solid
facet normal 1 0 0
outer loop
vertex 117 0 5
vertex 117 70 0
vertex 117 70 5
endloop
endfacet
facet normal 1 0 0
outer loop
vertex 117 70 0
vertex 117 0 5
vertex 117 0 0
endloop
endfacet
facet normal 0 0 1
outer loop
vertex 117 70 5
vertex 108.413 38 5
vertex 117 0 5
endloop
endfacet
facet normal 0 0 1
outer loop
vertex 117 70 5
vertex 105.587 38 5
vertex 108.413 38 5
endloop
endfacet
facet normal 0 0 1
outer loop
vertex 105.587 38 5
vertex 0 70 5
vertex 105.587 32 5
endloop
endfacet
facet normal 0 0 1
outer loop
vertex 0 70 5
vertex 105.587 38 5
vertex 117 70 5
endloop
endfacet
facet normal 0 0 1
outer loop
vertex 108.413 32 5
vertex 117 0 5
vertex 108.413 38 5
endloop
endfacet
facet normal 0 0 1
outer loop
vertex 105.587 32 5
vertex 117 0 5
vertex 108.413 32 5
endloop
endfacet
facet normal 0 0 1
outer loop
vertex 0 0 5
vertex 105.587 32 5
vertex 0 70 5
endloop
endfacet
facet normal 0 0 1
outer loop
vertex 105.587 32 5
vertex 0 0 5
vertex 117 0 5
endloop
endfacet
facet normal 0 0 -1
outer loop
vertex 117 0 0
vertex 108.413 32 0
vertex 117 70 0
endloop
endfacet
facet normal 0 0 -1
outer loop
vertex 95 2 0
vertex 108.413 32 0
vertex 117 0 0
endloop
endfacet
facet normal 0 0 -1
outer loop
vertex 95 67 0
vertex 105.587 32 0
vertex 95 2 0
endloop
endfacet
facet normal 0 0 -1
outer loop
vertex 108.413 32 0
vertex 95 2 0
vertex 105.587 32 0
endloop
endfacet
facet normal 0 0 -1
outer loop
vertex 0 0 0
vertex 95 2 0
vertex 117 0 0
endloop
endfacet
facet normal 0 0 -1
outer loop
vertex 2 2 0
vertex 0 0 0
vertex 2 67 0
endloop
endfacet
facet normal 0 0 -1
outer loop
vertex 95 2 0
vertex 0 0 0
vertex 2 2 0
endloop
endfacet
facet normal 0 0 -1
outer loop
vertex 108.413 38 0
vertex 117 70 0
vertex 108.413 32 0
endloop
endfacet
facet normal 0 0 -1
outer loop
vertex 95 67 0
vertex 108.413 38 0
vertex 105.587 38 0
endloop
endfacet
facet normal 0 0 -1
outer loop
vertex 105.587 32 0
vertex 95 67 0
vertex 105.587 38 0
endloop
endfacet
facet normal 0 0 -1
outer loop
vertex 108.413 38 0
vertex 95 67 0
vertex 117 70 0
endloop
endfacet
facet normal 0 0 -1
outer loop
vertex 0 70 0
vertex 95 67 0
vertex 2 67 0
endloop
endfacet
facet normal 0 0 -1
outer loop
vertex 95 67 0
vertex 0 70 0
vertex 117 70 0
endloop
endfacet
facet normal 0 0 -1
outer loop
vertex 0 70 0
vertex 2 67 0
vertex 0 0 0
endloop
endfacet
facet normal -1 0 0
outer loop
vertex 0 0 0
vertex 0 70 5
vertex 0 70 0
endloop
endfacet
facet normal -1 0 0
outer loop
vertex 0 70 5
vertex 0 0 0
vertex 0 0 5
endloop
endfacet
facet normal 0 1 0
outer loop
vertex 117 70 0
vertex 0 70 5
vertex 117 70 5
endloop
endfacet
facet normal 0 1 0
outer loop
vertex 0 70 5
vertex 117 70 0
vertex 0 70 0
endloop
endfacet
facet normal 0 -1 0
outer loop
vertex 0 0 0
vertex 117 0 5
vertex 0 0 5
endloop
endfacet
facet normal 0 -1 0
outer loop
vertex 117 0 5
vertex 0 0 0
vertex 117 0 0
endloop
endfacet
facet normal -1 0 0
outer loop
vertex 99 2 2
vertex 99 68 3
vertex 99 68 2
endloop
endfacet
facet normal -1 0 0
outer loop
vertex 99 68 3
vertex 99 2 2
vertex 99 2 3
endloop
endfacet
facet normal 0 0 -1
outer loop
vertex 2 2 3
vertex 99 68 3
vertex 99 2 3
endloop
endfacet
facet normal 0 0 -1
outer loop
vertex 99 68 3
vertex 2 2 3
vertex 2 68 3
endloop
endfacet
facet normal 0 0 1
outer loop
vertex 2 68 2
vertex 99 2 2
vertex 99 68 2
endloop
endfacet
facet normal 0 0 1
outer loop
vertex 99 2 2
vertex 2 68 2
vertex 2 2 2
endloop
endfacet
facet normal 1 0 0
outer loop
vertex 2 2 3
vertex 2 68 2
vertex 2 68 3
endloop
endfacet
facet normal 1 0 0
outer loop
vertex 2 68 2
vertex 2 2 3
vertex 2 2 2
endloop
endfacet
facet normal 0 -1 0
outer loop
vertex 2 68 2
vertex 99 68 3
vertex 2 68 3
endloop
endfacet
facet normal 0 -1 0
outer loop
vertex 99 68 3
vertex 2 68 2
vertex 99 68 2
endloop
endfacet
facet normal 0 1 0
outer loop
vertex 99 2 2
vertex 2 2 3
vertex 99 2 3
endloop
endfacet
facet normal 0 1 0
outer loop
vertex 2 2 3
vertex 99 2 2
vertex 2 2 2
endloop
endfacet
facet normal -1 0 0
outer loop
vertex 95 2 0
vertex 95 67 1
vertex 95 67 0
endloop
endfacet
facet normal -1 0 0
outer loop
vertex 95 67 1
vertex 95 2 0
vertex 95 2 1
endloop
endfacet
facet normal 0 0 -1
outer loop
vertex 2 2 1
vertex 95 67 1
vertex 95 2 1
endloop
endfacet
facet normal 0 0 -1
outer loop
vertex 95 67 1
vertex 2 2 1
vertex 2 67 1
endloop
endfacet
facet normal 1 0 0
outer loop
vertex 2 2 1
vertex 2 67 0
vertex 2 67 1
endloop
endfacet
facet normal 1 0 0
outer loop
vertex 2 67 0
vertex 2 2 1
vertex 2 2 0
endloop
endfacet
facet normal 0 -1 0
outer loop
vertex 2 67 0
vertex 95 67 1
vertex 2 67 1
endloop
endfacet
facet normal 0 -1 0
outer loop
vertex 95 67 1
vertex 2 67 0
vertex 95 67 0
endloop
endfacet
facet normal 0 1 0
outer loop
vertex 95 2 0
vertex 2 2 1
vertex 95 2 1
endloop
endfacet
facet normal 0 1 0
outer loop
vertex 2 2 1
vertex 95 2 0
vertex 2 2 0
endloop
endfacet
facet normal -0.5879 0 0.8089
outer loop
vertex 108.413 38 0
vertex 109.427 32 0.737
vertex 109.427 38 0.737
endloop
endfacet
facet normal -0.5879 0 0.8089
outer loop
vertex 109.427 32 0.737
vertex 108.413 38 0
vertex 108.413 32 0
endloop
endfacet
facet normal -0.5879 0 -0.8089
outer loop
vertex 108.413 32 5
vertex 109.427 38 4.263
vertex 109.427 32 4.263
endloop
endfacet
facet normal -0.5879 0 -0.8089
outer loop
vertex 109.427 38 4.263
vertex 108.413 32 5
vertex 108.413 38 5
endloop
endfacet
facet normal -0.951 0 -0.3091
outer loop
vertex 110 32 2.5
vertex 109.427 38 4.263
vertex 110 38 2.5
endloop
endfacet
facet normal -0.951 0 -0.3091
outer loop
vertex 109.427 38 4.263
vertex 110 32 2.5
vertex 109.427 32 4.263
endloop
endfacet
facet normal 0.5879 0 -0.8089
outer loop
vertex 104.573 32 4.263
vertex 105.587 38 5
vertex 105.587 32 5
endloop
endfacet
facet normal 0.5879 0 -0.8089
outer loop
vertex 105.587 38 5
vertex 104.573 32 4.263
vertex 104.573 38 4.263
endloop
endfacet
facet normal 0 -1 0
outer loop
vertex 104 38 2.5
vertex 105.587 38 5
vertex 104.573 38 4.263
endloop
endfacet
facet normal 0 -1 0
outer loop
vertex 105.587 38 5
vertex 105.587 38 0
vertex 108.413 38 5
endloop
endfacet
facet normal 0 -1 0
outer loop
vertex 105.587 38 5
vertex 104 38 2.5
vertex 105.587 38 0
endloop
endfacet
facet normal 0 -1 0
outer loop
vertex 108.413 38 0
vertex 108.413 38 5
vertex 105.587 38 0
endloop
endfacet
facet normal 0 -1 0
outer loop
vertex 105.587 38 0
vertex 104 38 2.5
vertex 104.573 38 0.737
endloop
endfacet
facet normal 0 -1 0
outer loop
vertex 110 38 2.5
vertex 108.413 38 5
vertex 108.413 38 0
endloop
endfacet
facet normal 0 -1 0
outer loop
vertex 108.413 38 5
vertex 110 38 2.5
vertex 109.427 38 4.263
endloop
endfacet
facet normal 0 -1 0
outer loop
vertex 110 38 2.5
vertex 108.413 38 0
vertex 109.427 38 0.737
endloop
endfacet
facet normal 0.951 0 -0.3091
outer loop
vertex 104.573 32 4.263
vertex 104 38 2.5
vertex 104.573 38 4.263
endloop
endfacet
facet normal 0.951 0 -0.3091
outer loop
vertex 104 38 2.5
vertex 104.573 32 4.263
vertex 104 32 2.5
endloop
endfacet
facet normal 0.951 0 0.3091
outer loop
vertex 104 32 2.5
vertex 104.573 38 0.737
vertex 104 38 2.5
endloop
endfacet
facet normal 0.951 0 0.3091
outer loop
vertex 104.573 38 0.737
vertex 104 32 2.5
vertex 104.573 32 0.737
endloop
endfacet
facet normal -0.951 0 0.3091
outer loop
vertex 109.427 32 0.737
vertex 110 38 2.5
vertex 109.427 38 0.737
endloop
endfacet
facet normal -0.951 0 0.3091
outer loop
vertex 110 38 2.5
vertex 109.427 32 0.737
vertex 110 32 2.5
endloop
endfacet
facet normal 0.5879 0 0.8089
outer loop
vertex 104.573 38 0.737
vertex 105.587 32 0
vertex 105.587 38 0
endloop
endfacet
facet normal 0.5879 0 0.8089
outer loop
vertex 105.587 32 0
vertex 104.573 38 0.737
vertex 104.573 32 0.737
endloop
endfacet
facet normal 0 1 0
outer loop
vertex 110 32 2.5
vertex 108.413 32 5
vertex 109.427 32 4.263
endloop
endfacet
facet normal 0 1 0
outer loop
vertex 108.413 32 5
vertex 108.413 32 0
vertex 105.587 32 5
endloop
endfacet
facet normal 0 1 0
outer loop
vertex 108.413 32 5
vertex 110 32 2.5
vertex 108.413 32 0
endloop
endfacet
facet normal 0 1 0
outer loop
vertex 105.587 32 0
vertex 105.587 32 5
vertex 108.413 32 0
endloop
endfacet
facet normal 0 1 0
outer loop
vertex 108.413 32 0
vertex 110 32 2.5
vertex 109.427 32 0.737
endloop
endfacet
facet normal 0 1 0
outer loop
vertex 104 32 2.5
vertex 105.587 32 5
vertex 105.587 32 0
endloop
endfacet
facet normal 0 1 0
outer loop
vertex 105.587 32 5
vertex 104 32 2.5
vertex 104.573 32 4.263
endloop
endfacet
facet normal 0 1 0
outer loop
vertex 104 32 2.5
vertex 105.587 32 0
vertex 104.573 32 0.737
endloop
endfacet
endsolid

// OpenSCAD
// -------------------
// Parameters
// -------------------
original_width = 97;          // Original width in mm
extension_width = 20;         // Extension width in mm
total_width = original_width + extension_width; // Total width after extension: 117 mm
case_height = 70;             // Height in mm
case_depth = 5;              // Depth in mm
wall_thickness = 2;           // Wall thickness in mm

// Screen Opening Parameters
screen_width = original_width - 2 * wall_thickness; // 93 mm
screen_height = 65;           // Screen height in mm
screen_thickness = 1;         // Screen opening depth in mm

// Badge Mount Hole Parameters
badge_mount_diameter = 6;     // Diameter of the badge mount hole in mm

// Lanyard Hole Parameters
lanyard_hole_diameter = 5;    // Diameter of the lanyard hole in mm
lanyard_hole_offset = total_width / 2;       // Offset from the top edge in mm

// -------------------
// Main Case Design
// -------------------
module plastic_case() {
    difference() {
        // Outer Shell: Main Case + Extension
        cube([total_width, case_height, case_depth], center=false);
        
        // Inner Cavity: Hollow out the main case (excluding extension)
        translate([wall_thickness, wall_thickness, wall_thickness])
            cube([original_width, case_height - 2 * wall_thickness, case_depth - 2 * wall_thickness]);
        
        // Screen Opening on the Front Face
        translate([wall_thickness, wall_thickness, 0])
            cube([screen_width, screen_height, screen_thickness]);
        
        // Badge Mount Hole on the Extension Side (Front Extension)
        translate([original_width + (extension_width / 2), case_height / 2, case_depth / 2])
            rotate([90, 0, 0]) // Rotate to align the hole with the front face
            cylinder(h = case_depth + 1, d = badge_mount_diameter, center=true);

    }
}

// -------------------
// Render the Case
// -------------------
plastic_case();
